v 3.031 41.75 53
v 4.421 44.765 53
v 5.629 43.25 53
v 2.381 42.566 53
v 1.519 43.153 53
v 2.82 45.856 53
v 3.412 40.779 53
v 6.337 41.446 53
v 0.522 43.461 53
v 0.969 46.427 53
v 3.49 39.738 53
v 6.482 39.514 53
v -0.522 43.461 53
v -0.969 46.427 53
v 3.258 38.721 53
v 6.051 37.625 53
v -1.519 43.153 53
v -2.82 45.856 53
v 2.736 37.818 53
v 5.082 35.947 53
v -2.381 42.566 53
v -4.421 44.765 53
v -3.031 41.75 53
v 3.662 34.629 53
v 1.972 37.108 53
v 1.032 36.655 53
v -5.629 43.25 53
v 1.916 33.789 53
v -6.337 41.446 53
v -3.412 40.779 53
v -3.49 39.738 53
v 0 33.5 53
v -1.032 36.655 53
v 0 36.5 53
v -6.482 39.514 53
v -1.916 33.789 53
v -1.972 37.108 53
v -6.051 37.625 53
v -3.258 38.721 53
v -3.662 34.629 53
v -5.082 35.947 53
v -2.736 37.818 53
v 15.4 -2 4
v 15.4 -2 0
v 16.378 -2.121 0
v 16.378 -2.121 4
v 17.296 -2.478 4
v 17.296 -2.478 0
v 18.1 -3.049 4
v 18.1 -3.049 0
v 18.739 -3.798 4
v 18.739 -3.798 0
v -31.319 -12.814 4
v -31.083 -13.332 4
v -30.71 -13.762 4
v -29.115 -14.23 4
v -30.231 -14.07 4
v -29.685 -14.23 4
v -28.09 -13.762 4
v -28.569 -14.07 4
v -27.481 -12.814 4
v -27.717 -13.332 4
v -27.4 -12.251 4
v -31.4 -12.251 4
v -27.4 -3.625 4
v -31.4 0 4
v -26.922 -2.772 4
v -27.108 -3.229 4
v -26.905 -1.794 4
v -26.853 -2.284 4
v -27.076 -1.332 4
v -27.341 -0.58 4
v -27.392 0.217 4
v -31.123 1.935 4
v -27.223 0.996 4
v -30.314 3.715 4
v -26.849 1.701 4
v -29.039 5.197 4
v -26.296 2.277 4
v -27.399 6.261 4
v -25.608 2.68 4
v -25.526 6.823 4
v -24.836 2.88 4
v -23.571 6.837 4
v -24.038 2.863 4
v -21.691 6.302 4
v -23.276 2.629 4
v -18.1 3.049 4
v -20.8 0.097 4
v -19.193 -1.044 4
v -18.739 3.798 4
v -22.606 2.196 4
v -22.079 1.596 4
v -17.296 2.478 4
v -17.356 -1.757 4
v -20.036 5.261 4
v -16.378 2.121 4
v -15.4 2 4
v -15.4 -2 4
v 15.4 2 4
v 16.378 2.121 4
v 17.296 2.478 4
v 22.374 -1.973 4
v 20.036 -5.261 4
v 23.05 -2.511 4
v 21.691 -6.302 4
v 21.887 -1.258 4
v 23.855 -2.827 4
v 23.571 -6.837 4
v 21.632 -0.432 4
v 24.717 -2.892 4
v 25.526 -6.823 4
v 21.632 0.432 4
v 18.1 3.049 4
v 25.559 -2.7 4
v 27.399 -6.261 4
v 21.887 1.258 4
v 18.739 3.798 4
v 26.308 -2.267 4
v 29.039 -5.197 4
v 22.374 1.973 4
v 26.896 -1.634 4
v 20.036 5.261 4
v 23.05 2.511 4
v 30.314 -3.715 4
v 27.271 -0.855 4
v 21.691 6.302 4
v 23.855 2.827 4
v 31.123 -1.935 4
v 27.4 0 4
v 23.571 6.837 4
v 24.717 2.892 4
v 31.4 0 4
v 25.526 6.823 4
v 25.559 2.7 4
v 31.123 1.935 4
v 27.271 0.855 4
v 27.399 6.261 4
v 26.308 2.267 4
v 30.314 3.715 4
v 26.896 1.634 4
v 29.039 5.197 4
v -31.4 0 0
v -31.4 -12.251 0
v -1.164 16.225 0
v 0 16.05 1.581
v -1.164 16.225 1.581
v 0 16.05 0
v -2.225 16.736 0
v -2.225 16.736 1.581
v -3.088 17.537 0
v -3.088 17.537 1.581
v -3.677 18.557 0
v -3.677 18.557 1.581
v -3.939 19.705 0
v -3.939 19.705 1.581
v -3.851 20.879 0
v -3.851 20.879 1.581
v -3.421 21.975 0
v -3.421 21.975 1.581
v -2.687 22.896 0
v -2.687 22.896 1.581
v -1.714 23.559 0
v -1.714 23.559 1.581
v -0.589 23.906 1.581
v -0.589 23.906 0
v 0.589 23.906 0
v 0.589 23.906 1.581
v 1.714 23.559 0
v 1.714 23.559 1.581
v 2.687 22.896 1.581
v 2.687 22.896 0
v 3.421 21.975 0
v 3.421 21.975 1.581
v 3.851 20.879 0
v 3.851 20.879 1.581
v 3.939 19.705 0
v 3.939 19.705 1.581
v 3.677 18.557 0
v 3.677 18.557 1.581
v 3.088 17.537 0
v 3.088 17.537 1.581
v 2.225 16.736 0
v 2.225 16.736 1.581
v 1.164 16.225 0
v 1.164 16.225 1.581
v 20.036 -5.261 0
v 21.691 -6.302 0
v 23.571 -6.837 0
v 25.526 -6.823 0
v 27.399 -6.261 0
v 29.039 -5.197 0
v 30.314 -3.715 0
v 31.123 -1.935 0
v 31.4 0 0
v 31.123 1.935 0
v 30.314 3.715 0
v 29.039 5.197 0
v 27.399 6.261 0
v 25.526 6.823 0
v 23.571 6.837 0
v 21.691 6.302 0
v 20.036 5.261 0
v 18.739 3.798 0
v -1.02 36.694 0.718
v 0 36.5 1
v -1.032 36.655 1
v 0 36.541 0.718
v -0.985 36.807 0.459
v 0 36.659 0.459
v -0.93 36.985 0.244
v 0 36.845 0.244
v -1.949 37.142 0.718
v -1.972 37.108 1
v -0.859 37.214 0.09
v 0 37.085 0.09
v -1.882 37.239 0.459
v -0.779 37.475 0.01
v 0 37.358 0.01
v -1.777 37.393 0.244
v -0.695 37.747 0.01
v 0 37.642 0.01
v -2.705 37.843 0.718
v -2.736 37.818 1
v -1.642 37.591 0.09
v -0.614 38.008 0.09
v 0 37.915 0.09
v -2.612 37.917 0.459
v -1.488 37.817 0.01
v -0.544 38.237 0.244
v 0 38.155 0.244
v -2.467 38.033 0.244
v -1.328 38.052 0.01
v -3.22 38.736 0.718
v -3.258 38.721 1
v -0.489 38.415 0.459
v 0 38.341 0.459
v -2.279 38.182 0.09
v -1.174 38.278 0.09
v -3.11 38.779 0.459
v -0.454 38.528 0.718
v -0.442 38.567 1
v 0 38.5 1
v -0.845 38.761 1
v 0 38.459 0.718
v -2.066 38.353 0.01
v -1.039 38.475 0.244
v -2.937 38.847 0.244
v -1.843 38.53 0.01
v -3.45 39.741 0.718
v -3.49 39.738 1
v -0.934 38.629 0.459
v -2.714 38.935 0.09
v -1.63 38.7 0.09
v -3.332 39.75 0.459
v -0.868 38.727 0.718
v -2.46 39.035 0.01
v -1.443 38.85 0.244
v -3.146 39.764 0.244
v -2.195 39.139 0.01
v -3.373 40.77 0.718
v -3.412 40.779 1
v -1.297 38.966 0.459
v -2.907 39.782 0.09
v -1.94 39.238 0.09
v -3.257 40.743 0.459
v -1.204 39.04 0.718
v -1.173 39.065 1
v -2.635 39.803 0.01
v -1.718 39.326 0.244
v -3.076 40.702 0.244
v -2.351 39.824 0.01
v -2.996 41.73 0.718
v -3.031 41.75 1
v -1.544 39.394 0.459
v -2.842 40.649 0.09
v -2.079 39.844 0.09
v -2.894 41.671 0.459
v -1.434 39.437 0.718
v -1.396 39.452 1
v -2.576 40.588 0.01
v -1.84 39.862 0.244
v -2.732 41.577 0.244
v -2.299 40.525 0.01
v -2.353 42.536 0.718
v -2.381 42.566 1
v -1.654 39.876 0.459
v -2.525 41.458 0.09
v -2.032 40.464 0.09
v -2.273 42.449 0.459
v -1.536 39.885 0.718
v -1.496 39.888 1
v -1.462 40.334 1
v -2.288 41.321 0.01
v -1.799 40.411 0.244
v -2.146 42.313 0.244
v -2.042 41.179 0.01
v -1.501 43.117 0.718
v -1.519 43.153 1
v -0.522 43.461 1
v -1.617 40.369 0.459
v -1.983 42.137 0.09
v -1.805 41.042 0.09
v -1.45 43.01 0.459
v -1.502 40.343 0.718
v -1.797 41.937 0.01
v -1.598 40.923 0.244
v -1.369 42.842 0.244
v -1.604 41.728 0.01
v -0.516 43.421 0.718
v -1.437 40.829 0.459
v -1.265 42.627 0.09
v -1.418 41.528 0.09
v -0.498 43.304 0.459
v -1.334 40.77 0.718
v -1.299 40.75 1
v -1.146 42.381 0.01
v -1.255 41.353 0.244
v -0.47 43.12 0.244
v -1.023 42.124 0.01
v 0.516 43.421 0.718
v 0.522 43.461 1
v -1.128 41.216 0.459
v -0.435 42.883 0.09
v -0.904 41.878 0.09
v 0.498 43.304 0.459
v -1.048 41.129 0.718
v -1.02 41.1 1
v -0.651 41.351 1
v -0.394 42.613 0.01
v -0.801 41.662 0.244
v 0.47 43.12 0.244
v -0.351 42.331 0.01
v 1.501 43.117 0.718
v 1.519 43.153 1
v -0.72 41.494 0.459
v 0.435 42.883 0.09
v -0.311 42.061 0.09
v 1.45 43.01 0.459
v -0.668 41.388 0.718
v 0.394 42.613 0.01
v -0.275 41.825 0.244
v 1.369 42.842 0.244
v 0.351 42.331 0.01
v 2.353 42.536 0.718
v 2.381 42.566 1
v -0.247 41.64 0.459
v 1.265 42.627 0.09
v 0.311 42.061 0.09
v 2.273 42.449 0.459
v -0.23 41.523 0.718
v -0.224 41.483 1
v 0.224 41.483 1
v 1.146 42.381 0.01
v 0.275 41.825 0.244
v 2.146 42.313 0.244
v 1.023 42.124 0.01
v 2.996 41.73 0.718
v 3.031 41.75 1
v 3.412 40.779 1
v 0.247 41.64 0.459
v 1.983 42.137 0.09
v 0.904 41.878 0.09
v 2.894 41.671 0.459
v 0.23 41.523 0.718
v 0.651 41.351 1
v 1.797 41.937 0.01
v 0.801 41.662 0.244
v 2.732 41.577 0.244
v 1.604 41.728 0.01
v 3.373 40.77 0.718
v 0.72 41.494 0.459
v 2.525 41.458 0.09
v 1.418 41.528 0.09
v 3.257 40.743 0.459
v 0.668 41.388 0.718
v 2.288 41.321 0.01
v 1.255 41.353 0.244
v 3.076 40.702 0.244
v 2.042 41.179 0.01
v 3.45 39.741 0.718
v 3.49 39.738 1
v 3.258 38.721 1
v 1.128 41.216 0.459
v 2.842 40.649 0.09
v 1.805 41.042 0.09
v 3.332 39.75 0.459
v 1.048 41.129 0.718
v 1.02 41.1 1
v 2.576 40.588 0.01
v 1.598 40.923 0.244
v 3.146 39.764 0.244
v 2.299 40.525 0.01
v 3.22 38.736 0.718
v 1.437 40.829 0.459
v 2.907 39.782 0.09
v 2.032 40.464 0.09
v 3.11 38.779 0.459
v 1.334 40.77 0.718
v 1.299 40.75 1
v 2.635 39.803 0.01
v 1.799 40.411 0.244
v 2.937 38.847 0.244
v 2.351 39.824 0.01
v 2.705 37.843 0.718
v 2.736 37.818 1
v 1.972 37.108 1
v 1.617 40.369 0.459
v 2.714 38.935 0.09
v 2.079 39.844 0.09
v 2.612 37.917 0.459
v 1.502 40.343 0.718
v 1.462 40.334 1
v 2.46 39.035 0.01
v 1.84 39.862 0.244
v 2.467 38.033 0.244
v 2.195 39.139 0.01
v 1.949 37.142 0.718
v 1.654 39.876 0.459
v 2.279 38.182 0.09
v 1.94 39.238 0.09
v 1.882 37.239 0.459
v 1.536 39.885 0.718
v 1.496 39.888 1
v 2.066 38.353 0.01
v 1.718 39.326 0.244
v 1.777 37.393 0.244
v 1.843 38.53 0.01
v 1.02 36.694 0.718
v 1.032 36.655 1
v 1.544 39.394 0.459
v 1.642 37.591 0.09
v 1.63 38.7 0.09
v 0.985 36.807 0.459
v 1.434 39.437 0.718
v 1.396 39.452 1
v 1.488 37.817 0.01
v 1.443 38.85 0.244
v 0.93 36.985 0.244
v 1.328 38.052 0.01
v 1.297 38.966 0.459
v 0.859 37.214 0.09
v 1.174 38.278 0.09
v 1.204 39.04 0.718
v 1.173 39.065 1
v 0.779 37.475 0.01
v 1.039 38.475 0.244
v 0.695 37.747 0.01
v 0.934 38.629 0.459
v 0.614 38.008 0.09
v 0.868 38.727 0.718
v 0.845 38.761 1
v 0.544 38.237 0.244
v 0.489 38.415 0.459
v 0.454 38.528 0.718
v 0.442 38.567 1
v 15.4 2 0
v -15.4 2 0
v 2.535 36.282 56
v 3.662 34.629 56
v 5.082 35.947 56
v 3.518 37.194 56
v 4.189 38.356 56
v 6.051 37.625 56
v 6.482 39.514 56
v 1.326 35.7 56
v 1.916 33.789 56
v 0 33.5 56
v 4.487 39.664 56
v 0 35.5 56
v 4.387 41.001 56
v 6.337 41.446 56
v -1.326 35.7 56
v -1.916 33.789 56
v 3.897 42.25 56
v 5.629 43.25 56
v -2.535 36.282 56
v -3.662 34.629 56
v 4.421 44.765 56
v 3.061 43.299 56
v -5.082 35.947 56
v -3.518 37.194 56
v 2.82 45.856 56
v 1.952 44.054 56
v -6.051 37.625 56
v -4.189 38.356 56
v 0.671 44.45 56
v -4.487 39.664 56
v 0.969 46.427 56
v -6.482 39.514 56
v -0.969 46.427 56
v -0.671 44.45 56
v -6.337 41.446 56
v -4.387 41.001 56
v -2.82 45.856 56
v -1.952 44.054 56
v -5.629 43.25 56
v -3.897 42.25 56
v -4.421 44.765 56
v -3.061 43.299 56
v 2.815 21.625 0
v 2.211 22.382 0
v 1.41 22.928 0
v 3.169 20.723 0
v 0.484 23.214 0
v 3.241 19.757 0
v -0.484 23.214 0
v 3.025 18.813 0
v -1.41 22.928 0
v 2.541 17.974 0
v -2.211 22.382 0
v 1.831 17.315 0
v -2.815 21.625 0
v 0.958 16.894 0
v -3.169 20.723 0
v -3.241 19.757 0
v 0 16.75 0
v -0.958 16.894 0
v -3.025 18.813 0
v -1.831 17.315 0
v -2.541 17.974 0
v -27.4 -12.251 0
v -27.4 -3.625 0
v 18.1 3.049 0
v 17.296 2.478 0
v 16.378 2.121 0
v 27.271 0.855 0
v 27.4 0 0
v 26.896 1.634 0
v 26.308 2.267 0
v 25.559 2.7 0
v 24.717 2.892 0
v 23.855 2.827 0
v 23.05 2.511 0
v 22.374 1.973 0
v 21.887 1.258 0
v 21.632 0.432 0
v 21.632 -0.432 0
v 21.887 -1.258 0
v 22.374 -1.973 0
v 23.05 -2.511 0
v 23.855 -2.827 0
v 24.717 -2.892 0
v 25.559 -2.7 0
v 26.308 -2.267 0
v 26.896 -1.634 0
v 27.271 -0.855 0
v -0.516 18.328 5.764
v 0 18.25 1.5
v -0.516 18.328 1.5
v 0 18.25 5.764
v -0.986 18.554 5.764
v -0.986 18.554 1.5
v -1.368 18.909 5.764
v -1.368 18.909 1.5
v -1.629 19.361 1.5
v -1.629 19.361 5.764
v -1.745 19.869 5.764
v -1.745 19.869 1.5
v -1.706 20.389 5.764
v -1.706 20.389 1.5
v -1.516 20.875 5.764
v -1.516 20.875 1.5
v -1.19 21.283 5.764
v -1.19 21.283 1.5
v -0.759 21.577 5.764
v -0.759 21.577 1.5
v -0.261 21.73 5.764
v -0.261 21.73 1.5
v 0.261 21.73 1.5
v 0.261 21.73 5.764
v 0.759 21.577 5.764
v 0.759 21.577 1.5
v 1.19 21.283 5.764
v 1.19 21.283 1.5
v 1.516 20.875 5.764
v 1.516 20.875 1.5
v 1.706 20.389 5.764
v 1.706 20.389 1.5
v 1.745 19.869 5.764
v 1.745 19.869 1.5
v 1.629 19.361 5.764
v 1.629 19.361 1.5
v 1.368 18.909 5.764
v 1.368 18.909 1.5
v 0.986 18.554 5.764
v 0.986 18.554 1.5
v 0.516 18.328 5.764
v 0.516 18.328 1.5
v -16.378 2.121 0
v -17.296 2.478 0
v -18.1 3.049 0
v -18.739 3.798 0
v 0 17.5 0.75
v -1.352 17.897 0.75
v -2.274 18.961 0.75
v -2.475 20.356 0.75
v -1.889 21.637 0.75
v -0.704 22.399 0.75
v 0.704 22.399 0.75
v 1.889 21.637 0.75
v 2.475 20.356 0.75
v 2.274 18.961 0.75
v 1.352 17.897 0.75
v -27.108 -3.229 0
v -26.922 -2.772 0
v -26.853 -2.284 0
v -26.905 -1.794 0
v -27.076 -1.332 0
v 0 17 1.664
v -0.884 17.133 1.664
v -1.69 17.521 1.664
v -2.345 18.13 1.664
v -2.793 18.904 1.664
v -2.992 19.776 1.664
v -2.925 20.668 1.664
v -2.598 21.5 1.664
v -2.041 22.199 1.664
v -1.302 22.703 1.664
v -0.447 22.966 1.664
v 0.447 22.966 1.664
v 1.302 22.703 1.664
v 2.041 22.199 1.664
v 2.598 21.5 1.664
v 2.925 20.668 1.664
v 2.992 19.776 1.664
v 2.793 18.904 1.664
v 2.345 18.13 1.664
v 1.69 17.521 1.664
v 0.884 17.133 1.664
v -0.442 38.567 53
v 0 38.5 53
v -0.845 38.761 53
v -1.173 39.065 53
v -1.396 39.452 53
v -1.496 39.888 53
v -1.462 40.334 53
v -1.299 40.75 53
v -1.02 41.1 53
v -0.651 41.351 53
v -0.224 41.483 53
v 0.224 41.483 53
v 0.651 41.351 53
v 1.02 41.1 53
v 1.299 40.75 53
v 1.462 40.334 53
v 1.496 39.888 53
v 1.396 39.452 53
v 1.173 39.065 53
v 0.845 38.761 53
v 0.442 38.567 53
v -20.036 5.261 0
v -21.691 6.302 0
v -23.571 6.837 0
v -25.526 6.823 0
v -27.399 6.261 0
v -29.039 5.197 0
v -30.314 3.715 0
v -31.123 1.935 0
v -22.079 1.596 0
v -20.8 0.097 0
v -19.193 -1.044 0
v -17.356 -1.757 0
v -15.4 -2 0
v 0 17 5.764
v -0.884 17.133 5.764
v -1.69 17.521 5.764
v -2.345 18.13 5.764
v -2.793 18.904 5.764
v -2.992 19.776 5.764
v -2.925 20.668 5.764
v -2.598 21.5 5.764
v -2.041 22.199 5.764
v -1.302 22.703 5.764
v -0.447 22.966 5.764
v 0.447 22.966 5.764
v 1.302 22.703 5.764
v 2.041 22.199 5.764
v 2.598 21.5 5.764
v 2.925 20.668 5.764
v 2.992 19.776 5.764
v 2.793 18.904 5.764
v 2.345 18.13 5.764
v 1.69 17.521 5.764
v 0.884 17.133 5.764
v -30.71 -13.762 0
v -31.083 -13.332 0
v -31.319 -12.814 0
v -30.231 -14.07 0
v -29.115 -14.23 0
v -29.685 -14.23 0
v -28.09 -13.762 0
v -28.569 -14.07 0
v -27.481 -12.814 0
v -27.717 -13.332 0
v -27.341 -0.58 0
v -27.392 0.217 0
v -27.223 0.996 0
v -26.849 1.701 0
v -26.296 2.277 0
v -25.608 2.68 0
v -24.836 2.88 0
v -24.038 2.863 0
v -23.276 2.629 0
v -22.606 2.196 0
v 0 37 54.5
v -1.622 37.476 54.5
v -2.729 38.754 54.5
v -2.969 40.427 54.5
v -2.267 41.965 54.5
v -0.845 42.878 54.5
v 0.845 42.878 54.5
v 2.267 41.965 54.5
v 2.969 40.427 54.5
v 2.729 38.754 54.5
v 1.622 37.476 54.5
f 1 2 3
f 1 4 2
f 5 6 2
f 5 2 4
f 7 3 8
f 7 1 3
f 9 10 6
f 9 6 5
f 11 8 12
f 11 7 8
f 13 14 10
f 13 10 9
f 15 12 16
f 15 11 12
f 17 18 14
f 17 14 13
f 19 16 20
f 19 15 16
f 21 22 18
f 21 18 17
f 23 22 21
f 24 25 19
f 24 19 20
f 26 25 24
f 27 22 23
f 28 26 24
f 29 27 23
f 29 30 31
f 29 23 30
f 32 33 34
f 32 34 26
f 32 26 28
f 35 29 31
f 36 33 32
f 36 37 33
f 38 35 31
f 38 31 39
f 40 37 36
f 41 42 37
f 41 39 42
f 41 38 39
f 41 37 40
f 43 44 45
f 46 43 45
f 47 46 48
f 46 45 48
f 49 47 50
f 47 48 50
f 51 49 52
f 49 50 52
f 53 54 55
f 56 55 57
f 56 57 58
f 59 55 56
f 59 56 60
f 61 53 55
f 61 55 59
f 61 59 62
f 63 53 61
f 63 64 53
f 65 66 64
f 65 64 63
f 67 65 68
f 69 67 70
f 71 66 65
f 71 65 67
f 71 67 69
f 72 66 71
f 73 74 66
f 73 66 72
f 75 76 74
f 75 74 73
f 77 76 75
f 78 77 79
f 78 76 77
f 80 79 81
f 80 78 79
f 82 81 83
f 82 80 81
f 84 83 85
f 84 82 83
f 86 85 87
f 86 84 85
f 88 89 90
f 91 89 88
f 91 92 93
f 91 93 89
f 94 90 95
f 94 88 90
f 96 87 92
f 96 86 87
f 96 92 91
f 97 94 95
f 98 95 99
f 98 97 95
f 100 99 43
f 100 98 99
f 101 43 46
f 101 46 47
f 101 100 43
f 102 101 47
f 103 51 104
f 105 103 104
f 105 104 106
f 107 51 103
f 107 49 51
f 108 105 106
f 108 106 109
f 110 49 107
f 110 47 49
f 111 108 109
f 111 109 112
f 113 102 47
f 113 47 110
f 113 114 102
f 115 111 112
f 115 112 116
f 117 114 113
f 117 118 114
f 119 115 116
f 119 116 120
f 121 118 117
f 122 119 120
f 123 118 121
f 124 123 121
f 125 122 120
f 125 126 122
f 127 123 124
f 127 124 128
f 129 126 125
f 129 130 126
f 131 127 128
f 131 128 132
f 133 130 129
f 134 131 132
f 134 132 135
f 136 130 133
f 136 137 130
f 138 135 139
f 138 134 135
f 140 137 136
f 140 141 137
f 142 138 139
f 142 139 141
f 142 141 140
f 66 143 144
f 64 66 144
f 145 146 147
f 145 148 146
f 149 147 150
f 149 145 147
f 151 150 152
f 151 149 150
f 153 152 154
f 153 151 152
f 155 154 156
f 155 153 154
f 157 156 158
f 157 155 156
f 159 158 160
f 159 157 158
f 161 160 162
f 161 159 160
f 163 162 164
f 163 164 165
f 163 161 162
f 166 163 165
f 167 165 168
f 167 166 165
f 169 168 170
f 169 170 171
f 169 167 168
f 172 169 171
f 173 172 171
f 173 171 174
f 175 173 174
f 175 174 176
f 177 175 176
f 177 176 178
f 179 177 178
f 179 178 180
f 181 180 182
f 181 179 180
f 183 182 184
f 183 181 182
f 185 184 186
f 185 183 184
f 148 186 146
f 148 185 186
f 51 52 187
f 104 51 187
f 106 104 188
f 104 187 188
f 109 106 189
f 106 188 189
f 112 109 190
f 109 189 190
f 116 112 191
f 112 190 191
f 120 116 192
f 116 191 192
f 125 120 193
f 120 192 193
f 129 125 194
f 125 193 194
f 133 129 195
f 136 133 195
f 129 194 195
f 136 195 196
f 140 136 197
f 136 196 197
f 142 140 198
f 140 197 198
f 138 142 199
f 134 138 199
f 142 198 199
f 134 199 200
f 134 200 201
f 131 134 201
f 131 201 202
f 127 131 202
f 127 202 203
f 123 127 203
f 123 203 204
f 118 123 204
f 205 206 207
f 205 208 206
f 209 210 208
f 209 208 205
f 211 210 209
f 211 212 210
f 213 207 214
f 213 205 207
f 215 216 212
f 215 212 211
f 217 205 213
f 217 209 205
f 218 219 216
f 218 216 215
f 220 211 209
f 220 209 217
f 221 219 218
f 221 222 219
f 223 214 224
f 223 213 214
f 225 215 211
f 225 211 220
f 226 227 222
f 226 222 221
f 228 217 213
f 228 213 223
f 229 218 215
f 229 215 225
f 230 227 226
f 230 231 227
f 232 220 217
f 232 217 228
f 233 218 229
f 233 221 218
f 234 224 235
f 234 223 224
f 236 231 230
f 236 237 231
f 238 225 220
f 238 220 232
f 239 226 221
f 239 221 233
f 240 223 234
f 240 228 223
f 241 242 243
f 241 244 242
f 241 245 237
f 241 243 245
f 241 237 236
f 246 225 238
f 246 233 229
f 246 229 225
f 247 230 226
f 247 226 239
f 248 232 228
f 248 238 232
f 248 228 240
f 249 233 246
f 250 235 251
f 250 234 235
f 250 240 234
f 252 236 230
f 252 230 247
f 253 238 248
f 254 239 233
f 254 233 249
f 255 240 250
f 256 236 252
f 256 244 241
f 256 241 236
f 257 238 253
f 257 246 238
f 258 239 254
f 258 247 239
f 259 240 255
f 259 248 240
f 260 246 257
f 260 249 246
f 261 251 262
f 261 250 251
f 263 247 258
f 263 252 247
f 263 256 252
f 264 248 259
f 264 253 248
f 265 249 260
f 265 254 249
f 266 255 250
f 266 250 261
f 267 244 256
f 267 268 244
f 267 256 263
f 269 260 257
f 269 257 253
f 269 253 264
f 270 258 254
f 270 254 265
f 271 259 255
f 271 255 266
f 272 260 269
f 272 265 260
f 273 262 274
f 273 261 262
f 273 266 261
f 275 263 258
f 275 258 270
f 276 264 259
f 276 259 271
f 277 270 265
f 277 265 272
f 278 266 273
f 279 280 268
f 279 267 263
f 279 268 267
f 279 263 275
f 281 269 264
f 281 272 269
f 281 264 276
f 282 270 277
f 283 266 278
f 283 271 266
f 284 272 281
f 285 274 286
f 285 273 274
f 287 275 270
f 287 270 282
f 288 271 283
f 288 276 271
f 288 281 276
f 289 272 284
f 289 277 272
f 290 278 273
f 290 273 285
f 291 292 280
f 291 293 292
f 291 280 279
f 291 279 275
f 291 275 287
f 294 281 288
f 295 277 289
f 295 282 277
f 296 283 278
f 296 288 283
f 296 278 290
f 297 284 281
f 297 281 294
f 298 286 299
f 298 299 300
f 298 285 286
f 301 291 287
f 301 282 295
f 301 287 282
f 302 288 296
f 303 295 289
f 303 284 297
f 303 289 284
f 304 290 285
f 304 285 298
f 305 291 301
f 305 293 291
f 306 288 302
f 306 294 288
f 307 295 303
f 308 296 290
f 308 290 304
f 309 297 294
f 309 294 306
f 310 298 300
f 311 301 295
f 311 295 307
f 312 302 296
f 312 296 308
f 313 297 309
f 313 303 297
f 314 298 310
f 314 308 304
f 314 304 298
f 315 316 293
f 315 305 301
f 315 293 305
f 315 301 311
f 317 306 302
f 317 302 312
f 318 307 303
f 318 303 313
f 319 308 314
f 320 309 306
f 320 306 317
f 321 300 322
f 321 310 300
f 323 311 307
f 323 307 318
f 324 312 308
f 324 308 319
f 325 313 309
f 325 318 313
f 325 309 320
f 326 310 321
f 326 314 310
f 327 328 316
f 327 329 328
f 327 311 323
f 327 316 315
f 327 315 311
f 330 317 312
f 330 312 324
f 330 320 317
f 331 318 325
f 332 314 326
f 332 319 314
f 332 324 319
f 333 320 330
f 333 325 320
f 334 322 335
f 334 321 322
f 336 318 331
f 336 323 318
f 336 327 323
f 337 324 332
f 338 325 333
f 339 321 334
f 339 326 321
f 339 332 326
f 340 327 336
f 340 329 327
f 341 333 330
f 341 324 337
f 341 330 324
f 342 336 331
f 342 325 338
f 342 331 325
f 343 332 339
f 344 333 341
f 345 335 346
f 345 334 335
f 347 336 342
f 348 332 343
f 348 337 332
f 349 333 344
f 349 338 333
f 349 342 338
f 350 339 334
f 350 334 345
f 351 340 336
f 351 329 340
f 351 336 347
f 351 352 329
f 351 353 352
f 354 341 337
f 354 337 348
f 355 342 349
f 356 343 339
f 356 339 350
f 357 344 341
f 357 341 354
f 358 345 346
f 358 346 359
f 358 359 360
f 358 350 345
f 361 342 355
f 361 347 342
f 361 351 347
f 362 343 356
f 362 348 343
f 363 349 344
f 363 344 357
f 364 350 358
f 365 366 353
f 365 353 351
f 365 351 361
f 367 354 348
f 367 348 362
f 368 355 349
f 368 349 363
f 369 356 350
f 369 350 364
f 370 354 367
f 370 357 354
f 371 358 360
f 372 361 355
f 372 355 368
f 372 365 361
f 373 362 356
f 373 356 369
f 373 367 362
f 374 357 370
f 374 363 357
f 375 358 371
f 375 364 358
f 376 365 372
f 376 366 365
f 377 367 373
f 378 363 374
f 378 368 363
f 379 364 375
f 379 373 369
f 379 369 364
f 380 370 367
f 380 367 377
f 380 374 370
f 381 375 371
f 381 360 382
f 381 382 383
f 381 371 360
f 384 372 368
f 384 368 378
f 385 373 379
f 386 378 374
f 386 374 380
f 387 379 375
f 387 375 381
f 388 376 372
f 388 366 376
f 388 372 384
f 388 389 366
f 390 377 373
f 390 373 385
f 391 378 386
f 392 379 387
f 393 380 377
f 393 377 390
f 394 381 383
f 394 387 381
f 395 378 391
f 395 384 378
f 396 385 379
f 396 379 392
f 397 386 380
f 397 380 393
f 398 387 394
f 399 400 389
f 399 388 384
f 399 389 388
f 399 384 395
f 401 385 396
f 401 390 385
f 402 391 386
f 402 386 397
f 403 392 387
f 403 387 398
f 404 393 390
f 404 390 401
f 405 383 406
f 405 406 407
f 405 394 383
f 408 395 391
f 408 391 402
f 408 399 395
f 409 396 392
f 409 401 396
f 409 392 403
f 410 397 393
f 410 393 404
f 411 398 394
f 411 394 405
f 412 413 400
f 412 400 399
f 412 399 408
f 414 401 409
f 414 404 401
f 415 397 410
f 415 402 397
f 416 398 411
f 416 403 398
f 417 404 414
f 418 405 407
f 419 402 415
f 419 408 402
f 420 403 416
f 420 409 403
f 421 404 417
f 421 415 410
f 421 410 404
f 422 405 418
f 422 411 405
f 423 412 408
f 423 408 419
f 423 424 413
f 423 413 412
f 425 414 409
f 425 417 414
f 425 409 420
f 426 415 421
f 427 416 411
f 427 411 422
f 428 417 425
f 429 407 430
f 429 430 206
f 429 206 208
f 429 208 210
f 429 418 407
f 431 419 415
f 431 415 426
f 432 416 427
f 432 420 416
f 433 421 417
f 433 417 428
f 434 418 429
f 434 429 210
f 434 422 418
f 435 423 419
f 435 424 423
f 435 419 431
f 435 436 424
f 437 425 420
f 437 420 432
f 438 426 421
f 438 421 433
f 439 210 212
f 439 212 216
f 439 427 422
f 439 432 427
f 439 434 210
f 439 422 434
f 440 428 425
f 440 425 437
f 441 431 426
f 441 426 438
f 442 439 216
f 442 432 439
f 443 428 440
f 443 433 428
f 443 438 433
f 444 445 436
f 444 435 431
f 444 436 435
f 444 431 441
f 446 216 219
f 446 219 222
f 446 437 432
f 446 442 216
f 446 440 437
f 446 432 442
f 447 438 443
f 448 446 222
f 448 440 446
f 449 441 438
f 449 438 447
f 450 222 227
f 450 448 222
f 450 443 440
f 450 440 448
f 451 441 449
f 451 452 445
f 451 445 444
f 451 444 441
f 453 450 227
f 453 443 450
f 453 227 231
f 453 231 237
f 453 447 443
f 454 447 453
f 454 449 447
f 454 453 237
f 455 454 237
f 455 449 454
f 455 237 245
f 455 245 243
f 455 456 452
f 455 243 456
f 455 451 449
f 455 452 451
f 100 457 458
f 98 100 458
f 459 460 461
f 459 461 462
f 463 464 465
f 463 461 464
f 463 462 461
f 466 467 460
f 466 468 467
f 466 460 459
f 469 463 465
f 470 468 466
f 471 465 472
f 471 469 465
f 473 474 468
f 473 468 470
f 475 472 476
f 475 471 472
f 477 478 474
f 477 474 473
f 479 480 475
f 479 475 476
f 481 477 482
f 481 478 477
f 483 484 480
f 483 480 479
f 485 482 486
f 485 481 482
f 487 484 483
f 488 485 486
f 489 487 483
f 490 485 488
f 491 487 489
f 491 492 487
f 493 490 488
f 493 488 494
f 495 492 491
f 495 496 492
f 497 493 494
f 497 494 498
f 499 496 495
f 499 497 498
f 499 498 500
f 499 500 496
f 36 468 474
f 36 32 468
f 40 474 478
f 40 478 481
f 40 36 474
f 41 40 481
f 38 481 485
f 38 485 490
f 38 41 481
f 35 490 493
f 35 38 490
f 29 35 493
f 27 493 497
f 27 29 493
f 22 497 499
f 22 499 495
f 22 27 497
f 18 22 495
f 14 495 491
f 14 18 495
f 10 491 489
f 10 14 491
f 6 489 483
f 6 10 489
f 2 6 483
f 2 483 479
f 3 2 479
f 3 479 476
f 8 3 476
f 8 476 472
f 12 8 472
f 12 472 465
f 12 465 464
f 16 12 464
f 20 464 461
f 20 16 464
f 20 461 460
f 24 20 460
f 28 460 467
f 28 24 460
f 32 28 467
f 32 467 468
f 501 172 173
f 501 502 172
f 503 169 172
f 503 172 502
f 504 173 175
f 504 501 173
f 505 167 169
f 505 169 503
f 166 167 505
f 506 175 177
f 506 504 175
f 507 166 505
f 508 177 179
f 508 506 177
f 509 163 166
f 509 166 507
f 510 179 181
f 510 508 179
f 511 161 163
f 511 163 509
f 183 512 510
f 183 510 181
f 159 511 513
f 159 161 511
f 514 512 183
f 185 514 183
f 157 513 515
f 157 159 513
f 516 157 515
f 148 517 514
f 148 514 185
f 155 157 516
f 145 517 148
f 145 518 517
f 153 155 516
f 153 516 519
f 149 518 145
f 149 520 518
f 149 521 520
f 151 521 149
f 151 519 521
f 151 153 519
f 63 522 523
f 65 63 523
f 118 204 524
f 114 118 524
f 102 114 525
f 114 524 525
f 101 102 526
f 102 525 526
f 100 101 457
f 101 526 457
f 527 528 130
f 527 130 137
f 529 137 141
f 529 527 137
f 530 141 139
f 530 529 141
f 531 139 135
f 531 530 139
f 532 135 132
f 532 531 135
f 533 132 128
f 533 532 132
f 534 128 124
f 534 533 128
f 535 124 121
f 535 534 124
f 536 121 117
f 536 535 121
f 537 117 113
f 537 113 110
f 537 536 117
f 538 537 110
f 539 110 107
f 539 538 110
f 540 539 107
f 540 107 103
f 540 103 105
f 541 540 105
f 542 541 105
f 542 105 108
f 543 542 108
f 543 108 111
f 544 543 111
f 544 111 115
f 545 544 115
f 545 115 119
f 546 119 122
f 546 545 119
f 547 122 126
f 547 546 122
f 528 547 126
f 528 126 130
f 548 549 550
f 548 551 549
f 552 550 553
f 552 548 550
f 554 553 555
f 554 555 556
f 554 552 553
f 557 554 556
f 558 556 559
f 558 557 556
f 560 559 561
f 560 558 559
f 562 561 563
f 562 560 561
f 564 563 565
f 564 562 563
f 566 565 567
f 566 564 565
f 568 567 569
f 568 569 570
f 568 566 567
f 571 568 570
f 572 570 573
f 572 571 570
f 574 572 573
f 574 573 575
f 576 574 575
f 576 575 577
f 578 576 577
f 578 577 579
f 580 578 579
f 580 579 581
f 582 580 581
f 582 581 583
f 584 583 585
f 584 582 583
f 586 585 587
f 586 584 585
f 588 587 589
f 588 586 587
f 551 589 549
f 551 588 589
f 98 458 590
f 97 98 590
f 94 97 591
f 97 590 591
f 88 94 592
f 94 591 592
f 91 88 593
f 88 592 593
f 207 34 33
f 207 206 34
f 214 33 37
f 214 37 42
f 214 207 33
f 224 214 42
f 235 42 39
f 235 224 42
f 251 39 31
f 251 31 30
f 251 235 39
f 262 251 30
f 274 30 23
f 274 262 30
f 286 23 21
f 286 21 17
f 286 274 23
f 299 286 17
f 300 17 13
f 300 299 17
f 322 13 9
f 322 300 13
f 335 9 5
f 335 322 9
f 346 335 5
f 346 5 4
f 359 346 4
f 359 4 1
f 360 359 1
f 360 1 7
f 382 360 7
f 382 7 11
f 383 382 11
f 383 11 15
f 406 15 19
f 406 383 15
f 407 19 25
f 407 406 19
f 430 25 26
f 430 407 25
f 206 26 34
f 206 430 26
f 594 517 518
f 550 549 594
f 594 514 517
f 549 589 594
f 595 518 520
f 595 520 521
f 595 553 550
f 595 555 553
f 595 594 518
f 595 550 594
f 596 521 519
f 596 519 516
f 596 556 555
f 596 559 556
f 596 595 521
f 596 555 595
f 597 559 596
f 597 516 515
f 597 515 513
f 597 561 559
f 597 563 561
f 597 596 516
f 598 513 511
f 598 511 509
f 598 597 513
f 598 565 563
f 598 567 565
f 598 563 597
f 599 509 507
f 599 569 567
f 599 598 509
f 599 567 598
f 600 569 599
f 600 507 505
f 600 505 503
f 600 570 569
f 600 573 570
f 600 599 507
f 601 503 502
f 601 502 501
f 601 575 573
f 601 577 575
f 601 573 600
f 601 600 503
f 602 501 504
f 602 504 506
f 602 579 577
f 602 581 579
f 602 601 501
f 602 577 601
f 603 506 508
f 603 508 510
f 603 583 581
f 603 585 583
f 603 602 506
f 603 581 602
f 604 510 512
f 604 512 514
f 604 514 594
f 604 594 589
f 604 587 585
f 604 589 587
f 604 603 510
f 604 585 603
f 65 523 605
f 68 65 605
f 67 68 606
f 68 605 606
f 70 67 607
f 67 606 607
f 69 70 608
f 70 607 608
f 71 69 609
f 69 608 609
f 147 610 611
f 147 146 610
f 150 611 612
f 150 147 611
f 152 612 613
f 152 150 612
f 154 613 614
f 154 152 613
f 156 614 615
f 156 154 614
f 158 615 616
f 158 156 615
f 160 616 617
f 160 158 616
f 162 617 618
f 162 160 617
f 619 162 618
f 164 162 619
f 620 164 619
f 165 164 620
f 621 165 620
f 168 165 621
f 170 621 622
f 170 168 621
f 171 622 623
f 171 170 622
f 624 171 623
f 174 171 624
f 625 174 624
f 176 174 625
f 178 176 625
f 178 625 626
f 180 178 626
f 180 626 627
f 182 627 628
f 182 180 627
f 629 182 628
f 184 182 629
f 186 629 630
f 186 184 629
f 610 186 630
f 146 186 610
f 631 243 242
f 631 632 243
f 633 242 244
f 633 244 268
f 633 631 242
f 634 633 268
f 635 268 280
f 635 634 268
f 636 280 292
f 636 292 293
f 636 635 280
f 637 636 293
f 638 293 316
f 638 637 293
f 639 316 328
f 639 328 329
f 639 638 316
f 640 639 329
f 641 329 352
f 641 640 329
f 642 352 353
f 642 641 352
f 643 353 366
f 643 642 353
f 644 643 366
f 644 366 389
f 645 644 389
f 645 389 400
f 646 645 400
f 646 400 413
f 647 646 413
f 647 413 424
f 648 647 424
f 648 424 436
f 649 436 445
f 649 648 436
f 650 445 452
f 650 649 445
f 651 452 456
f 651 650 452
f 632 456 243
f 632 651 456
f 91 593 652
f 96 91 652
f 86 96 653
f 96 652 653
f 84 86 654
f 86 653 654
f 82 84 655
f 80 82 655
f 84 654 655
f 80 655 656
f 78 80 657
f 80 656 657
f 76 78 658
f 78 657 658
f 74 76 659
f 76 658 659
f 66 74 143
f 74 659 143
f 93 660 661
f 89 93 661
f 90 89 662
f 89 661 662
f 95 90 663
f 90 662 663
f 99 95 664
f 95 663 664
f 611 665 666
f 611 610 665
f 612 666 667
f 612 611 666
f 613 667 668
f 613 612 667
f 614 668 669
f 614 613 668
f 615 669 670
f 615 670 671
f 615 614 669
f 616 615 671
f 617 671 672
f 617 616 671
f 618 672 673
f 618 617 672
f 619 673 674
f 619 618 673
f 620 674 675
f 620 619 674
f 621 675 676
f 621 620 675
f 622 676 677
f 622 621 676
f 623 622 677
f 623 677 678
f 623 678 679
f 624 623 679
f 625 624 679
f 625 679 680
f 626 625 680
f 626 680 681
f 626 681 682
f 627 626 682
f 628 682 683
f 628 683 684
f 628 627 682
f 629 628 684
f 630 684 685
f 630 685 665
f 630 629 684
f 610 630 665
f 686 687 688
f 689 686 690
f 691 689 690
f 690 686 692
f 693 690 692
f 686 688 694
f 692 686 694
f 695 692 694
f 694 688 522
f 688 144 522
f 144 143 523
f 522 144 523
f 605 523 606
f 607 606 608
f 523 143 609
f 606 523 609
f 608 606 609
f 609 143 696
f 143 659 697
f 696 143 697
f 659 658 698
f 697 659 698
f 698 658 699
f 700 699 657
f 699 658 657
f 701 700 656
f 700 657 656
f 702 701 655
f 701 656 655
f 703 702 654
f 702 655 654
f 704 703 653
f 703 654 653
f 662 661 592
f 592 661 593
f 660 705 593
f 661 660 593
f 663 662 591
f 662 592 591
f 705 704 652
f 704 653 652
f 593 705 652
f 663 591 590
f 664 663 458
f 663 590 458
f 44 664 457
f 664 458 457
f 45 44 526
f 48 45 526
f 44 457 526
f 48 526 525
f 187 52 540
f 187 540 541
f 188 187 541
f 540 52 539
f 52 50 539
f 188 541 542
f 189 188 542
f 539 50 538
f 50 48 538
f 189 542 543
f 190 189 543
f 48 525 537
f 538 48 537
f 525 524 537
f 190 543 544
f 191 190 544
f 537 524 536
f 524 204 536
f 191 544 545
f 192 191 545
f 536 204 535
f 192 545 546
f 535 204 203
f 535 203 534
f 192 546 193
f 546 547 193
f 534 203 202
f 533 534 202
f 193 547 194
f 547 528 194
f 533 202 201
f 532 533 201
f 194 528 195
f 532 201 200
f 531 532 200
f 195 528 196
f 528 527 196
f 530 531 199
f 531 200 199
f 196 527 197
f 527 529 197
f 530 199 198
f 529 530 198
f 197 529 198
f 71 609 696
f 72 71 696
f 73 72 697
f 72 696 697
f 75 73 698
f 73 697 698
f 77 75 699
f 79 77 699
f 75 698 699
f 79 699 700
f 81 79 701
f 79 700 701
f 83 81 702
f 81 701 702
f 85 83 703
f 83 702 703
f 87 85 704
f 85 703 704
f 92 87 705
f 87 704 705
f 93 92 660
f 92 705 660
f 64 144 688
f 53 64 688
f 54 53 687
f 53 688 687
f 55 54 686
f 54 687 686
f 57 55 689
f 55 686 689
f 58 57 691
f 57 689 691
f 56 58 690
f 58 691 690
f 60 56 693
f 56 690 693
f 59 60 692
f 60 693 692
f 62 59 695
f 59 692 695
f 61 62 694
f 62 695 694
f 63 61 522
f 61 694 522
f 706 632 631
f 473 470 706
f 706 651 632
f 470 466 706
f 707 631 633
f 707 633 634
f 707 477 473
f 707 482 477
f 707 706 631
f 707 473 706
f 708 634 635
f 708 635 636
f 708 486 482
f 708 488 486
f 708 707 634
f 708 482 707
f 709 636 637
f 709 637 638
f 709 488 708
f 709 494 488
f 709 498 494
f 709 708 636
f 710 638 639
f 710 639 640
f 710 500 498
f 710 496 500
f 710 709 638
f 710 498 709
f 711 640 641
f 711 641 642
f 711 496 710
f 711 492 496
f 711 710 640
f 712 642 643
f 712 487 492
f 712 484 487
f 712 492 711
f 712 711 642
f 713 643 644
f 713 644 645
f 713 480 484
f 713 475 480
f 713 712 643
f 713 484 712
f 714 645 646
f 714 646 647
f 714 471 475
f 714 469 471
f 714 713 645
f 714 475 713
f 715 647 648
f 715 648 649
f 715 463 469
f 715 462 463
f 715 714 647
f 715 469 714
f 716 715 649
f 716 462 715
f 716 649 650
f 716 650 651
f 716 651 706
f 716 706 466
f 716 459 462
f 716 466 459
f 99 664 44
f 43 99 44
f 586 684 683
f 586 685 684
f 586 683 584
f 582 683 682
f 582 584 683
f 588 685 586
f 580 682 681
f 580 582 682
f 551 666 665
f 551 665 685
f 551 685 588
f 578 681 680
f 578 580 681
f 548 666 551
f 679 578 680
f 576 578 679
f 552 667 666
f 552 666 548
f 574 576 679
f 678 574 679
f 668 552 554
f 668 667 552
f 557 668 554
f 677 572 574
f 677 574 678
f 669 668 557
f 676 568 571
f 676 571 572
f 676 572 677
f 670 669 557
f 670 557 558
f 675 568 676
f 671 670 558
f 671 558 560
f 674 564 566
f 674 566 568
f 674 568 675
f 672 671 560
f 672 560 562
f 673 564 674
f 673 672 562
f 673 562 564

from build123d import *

# Parameters (mm, degrees)
F1_R     = 2.9
F2_DEPTH = 4


# Not quite as in the source:
# - a feature names something its author has since deleted; it is built from what else it names


with BuildPart() as f2:
    # F1 (on Top) → F2 (new body)
    with BuildSketch(Plane.XY):
        with BuildLine():
            Line((15.4, 2), (-15.4, 2))
            ThreePointArc((-15.4, 2), (-17.2963992921, 2.4781156003), (-18.7394495413, 3.7981651376))
            ThreePointArc((-18.7394495413, 3.7981651376), (-26.4827004104, 6.609001368), (-31.4, 0))
            Line((-31.4, 0), (-31.4, -12.2506220506))
            ThreePointArc((-31.4, -12.2506220506), (-29.4, -14.2506220506), (-27.4, -12.2506220506))
            Line((-27.4, -12.2506220506), (-27.4, -3.6254295037))
            ThreePointArc((-27.4, -3.6254295037), (-26.8722153245, -2.5303907614), (-27.0759995835, -1.3320008055))
            ThreePointArc((-27.0759995835, -1.3320008055), (-25.9662125115, 2.5020433392), (-22.0788990826, 1.5963302752))
            ThreePointArc((-22.0788990826, 1.5963302752), (-19.1927985843, -1.0437687994), (-15.4, -2))
            Line((-15.4, -2), (15.4, -2))
            ThreePointArc((15.4, -2), (17.2963992921, -2.4781156003), (18.7394495413, -3.7981651376))
            ThreePointArc((18.7394495413, -3.7981651376), (31.4, 0), (18.7394495413, 3.7981651376))
            ThreePointArc((18.7394495413, 3.7981651376), (17.2963992921, 2.4781156003), (15.4, 2))
        make_face()
        with Locations((24.5, 0)):
            Circle(F1_R, mode=Mode.SUBTRACT)
    extrude(amount=F2_DEPTH)


with BuildPart() as f4:
    # F3 (on Right) → F4 (revolve)
    with BuildSketch(Plane.YZ):
        Polygon((16.05, 1.581099332), (16.05, 0), (16.75, 0), (18.25, 1.5), (18.25, 5.7642135624), (17, 5.7642135624), (17, 1.6642135624), align=None)
    revolve(axis=Axis((0, 20, 5.0162096566), (0, 0, -1)))


with BuildPart() as f5:
    # F3 (on Right) → F5 (revolve)
    with BuildSketch(Plane.YZ):
        with BuildLine():
            Line((36.5, 53), (36.5, 1))
            ThreePointArc((36.5, 1), (37.5, 0), (38.5, 1))
            Line((38.5, 1), (38.5, 53))
            Line((38.5, 53), (35.5, 56))
            Line((35.5, 56), (33.5, 56))
            Line((33.5, 56), (33.5, 53))
            Line((33.5, 53), (36.5, 53))
        make_face()
    revolve(axis=Axis((0, 40, 28.579190366), (0, 0, -1)))


solid = Compound([f2.part, f4.part, f5.part])
